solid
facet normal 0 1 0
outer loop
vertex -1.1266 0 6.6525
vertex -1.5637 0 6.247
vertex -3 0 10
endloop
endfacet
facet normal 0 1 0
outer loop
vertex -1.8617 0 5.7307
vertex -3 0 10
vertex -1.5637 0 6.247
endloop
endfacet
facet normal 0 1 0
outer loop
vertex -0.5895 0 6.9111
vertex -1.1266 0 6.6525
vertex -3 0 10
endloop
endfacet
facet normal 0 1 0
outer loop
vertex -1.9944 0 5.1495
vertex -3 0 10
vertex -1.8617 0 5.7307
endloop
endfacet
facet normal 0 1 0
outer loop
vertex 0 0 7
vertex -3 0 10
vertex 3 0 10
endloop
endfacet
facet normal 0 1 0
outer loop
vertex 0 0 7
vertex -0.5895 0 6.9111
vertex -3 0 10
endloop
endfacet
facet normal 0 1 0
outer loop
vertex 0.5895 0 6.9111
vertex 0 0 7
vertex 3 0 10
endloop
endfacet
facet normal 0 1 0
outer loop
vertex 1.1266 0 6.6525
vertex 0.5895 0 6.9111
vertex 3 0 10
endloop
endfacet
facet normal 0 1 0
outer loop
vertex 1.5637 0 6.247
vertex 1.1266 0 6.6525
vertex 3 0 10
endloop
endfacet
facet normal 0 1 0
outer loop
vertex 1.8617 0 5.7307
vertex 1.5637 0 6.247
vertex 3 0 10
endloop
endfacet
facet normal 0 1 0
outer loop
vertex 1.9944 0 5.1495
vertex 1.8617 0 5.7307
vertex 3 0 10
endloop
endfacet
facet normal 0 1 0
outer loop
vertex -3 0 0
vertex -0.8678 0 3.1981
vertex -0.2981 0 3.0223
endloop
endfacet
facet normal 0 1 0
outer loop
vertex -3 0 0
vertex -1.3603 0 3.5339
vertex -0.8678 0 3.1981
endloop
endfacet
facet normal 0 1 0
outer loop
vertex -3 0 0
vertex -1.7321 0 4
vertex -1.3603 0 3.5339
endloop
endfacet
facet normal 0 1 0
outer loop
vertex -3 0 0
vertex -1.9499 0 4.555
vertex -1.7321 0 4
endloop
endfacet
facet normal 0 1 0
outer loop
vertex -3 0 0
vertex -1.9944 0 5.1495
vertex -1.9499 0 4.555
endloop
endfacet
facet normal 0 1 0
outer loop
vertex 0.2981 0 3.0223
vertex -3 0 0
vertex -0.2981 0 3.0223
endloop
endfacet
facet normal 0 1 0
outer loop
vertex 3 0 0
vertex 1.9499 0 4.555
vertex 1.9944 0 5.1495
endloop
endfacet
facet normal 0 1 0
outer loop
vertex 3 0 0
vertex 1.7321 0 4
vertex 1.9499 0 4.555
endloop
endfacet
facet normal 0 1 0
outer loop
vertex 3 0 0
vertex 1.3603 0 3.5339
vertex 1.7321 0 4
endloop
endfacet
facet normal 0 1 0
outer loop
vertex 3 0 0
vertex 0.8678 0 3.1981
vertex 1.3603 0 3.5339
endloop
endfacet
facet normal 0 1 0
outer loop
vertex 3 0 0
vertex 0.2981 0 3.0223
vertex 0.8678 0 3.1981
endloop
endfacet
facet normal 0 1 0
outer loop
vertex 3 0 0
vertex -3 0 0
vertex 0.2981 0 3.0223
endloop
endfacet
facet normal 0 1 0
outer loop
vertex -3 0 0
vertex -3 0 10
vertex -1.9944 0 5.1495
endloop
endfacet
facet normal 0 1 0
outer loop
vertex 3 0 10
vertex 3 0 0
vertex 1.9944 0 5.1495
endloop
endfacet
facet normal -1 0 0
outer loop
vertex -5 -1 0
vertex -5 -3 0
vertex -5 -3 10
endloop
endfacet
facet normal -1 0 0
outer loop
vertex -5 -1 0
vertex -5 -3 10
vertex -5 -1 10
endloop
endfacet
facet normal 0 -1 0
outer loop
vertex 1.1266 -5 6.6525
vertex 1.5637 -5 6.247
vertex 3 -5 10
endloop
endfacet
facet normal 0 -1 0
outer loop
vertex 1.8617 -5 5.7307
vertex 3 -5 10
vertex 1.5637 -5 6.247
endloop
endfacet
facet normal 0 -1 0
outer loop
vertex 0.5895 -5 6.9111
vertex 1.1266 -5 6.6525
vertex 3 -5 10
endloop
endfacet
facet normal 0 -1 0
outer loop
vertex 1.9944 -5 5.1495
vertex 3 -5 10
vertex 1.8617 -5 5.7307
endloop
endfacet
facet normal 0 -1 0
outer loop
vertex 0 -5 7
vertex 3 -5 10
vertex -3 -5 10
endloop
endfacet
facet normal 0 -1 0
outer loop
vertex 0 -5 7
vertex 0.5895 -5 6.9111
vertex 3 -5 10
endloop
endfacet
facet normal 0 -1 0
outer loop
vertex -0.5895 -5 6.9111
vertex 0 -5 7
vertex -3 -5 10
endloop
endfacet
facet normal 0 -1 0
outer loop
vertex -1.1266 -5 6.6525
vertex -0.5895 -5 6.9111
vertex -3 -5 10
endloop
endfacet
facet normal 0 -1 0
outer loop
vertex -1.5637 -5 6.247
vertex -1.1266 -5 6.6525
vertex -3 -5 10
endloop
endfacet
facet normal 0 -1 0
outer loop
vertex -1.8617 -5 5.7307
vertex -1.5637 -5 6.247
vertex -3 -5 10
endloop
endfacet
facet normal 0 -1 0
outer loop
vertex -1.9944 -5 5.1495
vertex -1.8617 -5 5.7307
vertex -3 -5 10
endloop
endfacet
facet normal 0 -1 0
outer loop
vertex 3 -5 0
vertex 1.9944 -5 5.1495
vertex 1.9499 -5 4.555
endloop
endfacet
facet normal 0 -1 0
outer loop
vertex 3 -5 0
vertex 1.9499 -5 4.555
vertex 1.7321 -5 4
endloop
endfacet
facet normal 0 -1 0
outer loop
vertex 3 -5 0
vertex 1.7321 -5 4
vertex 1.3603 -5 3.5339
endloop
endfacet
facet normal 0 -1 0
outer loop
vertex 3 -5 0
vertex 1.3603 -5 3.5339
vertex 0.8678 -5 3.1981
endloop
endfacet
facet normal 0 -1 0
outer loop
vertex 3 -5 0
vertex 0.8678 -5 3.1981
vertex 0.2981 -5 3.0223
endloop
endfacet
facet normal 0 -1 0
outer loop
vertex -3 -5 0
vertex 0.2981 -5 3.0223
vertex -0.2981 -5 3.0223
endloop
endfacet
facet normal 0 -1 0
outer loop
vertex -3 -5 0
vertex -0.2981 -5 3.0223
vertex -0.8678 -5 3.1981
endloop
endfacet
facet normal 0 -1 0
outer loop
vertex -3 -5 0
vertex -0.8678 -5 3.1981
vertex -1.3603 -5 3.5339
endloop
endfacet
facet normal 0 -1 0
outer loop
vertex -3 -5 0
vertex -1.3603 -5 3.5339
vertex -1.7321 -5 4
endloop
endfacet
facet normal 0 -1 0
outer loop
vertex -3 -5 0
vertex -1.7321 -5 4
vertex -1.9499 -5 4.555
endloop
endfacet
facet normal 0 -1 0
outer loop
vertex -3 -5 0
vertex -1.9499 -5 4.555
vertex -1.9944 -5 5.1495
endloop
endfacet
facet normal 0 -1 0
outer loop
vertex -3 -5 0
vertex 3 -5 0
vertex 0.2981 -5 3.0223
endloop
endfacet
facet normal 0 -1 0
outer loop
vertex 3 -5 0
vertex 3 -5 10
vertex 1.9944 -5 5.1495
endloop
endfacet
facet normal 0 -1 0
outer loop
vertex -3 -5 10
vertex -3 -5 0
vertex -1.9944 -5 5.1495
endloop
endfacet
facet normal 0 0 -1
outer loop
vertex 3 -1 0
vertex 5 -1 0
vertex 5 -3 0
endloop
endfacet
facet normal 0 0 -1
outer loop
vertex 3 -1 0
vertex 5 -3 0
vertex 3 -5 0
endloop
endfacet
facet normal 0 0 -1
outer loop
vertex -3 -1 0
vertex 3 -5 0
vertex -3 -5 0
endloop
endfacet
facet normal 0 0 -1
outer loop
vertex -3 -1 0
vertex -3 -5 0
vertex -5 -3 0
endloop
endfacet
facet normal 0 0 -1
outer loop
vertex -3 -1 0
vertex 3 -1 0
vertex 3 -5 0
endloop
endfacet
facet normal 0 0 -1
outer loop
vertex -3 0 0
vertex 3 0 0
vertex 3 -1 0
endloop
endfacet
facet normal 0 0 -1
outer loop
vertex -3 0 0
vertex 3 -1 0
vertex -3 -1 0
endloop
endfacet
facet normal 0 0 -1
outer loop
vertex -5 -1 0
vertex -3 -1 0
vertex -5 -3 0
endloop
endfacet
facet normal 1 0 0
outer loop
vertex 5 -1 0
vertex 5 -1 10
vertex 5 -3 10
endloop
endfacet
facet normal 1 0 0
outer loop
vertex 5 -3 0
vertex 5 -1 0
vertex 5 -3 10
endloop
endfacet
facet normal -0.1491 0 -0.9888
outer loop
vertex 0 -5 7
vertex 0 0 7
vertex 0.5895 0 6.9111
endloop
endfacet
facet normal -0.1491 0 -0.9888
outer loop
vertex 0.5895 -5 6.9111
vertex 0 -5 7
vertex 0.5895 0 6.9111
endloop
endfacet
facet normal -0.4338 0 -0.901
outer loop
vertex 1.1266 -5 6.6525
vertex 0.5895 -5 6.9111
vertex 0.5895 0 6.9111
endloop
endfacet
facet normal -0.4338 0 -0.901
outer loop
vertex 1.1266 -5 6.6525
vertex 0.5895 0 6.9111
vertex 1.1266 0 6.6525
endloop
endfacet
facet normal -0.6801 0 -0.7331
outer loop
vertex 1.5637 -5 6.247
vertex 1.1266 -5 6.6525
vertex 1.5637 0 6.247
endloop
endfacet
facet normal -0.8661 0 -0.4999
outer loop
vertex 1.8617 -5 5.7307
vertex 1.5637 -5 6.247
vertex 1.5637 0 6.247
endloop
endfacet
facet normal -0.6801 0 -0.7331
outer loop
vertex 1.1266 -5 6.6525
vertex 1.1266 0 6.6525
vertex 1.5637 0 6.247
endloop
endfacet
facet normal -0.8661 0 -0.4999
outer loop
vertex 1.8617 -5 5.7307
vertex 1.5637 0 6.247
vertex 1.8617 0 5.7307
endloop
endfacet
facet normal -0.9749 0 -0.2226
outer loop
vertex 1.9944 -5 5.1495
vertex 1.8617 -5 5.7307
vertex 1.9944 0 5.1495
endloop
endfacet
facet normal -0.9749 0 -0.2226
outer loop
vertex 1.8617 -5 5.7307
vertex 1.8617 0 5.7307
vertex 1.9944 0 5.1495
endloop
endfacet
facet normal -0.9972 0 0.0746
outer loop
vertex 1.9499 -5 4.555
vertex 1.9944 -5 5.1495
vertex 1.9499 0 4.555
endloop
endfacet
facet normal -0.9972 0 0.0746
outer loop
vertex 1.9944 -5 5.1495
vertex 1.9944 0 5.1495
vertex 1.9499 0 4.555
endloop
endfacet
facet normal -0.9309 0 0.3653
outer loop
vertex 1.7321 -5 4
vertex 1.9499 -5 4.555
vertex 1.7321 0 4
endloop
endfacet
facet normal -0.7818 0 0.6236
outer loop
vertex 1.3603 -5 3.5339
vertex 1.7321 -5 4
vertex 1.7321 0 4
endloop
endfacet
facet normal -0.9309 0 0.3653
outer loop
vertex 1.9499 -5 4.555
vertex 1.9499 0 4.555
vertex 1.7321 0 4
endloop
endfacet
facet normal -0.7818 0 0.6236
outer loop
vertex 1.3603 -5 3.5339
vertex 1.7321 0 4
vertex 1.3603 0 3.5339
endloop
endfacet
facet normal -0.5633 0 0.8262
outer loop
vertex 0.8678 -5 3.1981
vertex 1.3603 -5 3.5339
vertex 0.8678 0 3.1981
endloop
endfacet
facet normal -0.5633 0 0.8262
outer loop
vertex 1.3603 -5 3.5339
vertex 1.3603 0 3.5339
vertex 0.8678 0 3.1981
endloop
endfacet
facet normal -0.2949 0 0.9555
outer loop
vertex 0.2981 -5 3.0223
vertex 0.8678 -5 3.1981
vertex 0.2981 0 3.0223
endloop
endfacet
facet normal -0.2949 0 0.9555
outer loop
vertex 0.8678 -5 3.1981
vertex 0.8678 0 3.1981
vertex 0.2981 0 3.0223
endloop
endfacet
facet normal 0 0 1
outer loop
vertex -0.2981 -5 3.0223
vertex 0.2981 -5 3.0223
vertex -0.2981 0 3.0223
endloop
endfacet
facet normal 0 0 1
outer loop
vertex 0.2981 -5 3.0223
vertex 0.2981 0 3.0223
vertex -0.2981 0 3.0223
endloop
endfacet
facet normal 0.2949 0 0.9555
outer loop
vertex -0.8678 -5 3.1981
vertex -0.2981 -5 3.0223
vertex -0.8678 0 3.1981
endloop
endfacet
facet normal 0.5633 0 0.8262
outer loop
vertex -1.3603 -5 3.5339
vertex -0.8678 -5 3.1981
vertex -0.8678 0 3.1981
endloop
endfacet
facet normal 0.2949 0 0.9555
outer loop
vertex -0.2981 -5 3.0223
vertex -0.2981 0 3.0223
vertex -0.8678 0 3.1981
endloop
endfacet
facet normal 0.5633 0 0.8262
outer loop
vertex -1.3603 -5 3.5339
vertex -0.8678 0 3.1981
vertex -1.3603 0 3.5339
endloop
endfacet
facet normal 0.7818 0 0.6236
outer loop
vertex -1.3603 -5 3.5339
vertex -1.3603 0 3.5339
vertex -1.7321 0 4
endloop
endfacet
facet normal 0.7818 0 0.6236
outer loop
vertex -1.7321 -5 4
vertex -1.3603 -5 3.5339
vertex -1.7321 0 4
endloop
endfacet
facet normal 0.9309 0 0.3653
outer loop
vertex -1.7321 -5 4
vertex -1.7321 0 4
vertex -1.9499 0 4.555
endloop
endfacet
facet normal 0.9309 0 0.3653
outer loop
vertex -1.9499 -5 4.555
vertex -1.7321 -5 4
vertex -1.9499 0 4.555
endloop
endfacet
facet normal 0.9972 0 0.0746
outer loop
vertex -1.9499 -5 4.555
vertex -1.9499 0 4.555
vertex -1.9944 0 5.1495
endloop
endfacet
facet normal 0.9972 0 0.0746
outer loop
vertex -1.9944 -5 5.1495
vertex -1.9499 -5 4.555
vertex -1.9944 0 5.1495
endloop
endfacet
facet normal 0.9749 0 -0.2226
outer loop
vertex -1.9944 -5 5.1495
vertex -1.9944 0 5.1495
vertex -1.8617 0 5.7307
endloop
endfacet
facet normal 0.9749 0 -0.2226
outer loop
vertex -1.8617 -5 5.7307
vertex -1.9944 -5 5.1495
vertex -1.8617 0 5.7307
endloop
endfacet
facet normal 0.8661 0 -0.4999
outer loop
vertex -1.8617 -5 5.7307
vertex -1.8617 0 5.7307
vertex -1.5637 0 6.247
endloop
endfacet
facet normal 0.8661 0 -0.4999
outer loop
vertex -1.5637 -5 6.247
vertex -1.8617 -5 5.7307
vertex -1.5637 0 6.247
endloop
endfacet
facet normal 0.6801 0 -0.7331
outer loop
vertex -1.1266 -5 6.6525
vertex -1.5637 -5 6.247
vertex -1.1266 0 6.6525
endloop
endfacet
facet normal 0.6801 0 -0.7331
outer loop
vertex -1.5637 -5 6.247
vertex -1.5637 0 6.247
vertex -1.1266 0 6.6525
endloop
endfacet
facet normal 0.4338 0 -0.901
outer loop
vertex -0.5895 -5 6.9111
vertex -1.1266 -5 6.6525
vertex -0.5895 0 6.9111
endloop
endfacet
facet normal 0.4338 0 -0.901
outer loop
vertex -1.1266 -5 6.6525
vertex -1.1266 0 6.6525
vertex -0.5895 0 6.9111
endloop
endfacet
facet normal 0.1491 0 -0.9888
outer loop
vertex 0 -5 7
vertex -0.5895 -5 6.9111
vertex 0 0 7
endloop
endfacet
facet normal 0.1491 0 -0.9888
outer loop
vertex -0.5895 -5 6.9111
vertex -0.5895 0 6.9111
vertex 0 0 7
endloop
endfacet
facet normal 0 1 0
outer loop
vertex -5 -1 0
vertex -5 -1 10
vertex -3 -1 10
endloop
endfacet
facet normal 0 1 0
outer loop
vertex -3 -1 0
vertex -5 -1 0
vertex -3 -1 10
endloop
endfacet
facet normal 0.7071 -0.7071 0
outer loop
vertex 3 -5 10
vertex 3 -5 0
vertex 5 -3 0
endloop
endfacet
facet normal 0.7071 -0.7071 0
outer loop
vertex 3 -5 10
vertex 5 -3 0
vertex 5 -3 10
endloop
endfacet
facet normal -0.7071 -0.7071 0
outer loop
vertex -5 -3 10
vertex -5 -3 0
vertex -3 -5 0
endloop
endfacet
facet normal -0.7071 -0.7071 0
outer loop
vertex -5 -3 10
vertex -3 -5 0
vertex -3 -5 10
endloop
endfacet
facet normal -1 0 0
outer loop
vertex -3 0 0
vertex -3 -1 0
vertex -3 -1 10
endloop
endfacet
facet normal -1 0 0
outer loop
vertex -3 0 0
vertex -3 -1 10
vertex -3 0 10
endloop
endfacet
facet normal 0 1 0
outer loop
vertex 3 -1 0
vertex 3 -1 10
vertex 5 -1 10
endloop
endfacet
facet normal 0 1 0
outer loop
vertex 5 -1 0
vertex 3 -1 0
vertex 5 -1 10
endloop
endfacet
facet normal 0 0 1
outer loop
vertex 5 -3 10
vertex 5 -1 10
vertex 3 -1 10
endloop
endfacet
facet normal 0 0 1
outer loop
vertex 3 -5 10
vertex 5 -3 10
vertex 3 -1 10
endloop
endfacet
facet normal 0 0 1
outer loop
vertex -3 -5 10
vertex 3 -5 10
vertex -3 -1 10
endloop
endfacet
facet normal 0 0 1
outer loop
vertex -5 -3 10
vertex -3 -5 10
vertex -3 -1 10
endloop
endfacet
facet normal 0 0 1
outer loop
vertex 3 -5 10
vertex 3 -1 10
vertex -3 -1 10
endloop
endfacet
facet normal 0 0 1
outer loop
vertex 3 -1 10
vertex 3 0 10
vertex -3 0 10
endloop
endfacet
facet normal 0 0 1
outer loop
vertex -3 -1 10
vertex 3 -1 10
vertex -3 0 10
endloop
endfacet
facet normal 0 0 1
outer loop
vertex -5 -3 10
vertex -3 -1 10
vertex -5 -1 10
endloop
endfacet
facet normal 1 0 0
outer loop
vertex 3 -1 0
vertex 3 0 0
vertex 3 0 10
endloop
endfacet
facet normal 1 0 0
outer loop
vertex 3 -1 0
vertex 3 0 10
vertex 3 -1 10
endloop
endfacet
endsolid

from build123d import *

# Parameters (mm, degrees)
RESSALTO_EXTRUS_O1_DEPTH = 10
CHANFRO1_SIZE            = 2
ESBO_O2_R                = 2
CORTE_EXTRUS_O1_DEPTH    = 5


with BuildPart() as part:
    # Esboço1 → Ressalto-extrusão1 (new body)
    with BuildSketch(Plane.XY):
        Polygon((-3, 0), (3, 0), (3, -1), (5, -1), (5, -5), (-5, -5), (-5, -1), (-3, -1), align=None)
    extrude(amount=RESSALTO_EXTRUS_O1_DEPTH)

    # Chanfro1
    chanfro1_edges = [part.edges().sort_by_distance(p)[0] for p in [
        (5, -5, 5),
        (-5, -5, 5),
    ]]
    chamfer(chanfro1_edges, length=CHANFRO1_SIZE)

    # Esboço2 → Corte-extrusão1 (cut)
    with BuildSketch(Plane(origin=(0, 0, 0), x_dir=(1, 0, 0), z_dir=(0, 1, 0))):
        with Locations(Location((0, -5, 0), (0, 0, 270))):
            Circle(ESBO_O2_R)
    extrude(amount=-CORTE_EXTRUS_O1_DEPTH, mode=Mode.SUBTRACT)


solid = part.part
